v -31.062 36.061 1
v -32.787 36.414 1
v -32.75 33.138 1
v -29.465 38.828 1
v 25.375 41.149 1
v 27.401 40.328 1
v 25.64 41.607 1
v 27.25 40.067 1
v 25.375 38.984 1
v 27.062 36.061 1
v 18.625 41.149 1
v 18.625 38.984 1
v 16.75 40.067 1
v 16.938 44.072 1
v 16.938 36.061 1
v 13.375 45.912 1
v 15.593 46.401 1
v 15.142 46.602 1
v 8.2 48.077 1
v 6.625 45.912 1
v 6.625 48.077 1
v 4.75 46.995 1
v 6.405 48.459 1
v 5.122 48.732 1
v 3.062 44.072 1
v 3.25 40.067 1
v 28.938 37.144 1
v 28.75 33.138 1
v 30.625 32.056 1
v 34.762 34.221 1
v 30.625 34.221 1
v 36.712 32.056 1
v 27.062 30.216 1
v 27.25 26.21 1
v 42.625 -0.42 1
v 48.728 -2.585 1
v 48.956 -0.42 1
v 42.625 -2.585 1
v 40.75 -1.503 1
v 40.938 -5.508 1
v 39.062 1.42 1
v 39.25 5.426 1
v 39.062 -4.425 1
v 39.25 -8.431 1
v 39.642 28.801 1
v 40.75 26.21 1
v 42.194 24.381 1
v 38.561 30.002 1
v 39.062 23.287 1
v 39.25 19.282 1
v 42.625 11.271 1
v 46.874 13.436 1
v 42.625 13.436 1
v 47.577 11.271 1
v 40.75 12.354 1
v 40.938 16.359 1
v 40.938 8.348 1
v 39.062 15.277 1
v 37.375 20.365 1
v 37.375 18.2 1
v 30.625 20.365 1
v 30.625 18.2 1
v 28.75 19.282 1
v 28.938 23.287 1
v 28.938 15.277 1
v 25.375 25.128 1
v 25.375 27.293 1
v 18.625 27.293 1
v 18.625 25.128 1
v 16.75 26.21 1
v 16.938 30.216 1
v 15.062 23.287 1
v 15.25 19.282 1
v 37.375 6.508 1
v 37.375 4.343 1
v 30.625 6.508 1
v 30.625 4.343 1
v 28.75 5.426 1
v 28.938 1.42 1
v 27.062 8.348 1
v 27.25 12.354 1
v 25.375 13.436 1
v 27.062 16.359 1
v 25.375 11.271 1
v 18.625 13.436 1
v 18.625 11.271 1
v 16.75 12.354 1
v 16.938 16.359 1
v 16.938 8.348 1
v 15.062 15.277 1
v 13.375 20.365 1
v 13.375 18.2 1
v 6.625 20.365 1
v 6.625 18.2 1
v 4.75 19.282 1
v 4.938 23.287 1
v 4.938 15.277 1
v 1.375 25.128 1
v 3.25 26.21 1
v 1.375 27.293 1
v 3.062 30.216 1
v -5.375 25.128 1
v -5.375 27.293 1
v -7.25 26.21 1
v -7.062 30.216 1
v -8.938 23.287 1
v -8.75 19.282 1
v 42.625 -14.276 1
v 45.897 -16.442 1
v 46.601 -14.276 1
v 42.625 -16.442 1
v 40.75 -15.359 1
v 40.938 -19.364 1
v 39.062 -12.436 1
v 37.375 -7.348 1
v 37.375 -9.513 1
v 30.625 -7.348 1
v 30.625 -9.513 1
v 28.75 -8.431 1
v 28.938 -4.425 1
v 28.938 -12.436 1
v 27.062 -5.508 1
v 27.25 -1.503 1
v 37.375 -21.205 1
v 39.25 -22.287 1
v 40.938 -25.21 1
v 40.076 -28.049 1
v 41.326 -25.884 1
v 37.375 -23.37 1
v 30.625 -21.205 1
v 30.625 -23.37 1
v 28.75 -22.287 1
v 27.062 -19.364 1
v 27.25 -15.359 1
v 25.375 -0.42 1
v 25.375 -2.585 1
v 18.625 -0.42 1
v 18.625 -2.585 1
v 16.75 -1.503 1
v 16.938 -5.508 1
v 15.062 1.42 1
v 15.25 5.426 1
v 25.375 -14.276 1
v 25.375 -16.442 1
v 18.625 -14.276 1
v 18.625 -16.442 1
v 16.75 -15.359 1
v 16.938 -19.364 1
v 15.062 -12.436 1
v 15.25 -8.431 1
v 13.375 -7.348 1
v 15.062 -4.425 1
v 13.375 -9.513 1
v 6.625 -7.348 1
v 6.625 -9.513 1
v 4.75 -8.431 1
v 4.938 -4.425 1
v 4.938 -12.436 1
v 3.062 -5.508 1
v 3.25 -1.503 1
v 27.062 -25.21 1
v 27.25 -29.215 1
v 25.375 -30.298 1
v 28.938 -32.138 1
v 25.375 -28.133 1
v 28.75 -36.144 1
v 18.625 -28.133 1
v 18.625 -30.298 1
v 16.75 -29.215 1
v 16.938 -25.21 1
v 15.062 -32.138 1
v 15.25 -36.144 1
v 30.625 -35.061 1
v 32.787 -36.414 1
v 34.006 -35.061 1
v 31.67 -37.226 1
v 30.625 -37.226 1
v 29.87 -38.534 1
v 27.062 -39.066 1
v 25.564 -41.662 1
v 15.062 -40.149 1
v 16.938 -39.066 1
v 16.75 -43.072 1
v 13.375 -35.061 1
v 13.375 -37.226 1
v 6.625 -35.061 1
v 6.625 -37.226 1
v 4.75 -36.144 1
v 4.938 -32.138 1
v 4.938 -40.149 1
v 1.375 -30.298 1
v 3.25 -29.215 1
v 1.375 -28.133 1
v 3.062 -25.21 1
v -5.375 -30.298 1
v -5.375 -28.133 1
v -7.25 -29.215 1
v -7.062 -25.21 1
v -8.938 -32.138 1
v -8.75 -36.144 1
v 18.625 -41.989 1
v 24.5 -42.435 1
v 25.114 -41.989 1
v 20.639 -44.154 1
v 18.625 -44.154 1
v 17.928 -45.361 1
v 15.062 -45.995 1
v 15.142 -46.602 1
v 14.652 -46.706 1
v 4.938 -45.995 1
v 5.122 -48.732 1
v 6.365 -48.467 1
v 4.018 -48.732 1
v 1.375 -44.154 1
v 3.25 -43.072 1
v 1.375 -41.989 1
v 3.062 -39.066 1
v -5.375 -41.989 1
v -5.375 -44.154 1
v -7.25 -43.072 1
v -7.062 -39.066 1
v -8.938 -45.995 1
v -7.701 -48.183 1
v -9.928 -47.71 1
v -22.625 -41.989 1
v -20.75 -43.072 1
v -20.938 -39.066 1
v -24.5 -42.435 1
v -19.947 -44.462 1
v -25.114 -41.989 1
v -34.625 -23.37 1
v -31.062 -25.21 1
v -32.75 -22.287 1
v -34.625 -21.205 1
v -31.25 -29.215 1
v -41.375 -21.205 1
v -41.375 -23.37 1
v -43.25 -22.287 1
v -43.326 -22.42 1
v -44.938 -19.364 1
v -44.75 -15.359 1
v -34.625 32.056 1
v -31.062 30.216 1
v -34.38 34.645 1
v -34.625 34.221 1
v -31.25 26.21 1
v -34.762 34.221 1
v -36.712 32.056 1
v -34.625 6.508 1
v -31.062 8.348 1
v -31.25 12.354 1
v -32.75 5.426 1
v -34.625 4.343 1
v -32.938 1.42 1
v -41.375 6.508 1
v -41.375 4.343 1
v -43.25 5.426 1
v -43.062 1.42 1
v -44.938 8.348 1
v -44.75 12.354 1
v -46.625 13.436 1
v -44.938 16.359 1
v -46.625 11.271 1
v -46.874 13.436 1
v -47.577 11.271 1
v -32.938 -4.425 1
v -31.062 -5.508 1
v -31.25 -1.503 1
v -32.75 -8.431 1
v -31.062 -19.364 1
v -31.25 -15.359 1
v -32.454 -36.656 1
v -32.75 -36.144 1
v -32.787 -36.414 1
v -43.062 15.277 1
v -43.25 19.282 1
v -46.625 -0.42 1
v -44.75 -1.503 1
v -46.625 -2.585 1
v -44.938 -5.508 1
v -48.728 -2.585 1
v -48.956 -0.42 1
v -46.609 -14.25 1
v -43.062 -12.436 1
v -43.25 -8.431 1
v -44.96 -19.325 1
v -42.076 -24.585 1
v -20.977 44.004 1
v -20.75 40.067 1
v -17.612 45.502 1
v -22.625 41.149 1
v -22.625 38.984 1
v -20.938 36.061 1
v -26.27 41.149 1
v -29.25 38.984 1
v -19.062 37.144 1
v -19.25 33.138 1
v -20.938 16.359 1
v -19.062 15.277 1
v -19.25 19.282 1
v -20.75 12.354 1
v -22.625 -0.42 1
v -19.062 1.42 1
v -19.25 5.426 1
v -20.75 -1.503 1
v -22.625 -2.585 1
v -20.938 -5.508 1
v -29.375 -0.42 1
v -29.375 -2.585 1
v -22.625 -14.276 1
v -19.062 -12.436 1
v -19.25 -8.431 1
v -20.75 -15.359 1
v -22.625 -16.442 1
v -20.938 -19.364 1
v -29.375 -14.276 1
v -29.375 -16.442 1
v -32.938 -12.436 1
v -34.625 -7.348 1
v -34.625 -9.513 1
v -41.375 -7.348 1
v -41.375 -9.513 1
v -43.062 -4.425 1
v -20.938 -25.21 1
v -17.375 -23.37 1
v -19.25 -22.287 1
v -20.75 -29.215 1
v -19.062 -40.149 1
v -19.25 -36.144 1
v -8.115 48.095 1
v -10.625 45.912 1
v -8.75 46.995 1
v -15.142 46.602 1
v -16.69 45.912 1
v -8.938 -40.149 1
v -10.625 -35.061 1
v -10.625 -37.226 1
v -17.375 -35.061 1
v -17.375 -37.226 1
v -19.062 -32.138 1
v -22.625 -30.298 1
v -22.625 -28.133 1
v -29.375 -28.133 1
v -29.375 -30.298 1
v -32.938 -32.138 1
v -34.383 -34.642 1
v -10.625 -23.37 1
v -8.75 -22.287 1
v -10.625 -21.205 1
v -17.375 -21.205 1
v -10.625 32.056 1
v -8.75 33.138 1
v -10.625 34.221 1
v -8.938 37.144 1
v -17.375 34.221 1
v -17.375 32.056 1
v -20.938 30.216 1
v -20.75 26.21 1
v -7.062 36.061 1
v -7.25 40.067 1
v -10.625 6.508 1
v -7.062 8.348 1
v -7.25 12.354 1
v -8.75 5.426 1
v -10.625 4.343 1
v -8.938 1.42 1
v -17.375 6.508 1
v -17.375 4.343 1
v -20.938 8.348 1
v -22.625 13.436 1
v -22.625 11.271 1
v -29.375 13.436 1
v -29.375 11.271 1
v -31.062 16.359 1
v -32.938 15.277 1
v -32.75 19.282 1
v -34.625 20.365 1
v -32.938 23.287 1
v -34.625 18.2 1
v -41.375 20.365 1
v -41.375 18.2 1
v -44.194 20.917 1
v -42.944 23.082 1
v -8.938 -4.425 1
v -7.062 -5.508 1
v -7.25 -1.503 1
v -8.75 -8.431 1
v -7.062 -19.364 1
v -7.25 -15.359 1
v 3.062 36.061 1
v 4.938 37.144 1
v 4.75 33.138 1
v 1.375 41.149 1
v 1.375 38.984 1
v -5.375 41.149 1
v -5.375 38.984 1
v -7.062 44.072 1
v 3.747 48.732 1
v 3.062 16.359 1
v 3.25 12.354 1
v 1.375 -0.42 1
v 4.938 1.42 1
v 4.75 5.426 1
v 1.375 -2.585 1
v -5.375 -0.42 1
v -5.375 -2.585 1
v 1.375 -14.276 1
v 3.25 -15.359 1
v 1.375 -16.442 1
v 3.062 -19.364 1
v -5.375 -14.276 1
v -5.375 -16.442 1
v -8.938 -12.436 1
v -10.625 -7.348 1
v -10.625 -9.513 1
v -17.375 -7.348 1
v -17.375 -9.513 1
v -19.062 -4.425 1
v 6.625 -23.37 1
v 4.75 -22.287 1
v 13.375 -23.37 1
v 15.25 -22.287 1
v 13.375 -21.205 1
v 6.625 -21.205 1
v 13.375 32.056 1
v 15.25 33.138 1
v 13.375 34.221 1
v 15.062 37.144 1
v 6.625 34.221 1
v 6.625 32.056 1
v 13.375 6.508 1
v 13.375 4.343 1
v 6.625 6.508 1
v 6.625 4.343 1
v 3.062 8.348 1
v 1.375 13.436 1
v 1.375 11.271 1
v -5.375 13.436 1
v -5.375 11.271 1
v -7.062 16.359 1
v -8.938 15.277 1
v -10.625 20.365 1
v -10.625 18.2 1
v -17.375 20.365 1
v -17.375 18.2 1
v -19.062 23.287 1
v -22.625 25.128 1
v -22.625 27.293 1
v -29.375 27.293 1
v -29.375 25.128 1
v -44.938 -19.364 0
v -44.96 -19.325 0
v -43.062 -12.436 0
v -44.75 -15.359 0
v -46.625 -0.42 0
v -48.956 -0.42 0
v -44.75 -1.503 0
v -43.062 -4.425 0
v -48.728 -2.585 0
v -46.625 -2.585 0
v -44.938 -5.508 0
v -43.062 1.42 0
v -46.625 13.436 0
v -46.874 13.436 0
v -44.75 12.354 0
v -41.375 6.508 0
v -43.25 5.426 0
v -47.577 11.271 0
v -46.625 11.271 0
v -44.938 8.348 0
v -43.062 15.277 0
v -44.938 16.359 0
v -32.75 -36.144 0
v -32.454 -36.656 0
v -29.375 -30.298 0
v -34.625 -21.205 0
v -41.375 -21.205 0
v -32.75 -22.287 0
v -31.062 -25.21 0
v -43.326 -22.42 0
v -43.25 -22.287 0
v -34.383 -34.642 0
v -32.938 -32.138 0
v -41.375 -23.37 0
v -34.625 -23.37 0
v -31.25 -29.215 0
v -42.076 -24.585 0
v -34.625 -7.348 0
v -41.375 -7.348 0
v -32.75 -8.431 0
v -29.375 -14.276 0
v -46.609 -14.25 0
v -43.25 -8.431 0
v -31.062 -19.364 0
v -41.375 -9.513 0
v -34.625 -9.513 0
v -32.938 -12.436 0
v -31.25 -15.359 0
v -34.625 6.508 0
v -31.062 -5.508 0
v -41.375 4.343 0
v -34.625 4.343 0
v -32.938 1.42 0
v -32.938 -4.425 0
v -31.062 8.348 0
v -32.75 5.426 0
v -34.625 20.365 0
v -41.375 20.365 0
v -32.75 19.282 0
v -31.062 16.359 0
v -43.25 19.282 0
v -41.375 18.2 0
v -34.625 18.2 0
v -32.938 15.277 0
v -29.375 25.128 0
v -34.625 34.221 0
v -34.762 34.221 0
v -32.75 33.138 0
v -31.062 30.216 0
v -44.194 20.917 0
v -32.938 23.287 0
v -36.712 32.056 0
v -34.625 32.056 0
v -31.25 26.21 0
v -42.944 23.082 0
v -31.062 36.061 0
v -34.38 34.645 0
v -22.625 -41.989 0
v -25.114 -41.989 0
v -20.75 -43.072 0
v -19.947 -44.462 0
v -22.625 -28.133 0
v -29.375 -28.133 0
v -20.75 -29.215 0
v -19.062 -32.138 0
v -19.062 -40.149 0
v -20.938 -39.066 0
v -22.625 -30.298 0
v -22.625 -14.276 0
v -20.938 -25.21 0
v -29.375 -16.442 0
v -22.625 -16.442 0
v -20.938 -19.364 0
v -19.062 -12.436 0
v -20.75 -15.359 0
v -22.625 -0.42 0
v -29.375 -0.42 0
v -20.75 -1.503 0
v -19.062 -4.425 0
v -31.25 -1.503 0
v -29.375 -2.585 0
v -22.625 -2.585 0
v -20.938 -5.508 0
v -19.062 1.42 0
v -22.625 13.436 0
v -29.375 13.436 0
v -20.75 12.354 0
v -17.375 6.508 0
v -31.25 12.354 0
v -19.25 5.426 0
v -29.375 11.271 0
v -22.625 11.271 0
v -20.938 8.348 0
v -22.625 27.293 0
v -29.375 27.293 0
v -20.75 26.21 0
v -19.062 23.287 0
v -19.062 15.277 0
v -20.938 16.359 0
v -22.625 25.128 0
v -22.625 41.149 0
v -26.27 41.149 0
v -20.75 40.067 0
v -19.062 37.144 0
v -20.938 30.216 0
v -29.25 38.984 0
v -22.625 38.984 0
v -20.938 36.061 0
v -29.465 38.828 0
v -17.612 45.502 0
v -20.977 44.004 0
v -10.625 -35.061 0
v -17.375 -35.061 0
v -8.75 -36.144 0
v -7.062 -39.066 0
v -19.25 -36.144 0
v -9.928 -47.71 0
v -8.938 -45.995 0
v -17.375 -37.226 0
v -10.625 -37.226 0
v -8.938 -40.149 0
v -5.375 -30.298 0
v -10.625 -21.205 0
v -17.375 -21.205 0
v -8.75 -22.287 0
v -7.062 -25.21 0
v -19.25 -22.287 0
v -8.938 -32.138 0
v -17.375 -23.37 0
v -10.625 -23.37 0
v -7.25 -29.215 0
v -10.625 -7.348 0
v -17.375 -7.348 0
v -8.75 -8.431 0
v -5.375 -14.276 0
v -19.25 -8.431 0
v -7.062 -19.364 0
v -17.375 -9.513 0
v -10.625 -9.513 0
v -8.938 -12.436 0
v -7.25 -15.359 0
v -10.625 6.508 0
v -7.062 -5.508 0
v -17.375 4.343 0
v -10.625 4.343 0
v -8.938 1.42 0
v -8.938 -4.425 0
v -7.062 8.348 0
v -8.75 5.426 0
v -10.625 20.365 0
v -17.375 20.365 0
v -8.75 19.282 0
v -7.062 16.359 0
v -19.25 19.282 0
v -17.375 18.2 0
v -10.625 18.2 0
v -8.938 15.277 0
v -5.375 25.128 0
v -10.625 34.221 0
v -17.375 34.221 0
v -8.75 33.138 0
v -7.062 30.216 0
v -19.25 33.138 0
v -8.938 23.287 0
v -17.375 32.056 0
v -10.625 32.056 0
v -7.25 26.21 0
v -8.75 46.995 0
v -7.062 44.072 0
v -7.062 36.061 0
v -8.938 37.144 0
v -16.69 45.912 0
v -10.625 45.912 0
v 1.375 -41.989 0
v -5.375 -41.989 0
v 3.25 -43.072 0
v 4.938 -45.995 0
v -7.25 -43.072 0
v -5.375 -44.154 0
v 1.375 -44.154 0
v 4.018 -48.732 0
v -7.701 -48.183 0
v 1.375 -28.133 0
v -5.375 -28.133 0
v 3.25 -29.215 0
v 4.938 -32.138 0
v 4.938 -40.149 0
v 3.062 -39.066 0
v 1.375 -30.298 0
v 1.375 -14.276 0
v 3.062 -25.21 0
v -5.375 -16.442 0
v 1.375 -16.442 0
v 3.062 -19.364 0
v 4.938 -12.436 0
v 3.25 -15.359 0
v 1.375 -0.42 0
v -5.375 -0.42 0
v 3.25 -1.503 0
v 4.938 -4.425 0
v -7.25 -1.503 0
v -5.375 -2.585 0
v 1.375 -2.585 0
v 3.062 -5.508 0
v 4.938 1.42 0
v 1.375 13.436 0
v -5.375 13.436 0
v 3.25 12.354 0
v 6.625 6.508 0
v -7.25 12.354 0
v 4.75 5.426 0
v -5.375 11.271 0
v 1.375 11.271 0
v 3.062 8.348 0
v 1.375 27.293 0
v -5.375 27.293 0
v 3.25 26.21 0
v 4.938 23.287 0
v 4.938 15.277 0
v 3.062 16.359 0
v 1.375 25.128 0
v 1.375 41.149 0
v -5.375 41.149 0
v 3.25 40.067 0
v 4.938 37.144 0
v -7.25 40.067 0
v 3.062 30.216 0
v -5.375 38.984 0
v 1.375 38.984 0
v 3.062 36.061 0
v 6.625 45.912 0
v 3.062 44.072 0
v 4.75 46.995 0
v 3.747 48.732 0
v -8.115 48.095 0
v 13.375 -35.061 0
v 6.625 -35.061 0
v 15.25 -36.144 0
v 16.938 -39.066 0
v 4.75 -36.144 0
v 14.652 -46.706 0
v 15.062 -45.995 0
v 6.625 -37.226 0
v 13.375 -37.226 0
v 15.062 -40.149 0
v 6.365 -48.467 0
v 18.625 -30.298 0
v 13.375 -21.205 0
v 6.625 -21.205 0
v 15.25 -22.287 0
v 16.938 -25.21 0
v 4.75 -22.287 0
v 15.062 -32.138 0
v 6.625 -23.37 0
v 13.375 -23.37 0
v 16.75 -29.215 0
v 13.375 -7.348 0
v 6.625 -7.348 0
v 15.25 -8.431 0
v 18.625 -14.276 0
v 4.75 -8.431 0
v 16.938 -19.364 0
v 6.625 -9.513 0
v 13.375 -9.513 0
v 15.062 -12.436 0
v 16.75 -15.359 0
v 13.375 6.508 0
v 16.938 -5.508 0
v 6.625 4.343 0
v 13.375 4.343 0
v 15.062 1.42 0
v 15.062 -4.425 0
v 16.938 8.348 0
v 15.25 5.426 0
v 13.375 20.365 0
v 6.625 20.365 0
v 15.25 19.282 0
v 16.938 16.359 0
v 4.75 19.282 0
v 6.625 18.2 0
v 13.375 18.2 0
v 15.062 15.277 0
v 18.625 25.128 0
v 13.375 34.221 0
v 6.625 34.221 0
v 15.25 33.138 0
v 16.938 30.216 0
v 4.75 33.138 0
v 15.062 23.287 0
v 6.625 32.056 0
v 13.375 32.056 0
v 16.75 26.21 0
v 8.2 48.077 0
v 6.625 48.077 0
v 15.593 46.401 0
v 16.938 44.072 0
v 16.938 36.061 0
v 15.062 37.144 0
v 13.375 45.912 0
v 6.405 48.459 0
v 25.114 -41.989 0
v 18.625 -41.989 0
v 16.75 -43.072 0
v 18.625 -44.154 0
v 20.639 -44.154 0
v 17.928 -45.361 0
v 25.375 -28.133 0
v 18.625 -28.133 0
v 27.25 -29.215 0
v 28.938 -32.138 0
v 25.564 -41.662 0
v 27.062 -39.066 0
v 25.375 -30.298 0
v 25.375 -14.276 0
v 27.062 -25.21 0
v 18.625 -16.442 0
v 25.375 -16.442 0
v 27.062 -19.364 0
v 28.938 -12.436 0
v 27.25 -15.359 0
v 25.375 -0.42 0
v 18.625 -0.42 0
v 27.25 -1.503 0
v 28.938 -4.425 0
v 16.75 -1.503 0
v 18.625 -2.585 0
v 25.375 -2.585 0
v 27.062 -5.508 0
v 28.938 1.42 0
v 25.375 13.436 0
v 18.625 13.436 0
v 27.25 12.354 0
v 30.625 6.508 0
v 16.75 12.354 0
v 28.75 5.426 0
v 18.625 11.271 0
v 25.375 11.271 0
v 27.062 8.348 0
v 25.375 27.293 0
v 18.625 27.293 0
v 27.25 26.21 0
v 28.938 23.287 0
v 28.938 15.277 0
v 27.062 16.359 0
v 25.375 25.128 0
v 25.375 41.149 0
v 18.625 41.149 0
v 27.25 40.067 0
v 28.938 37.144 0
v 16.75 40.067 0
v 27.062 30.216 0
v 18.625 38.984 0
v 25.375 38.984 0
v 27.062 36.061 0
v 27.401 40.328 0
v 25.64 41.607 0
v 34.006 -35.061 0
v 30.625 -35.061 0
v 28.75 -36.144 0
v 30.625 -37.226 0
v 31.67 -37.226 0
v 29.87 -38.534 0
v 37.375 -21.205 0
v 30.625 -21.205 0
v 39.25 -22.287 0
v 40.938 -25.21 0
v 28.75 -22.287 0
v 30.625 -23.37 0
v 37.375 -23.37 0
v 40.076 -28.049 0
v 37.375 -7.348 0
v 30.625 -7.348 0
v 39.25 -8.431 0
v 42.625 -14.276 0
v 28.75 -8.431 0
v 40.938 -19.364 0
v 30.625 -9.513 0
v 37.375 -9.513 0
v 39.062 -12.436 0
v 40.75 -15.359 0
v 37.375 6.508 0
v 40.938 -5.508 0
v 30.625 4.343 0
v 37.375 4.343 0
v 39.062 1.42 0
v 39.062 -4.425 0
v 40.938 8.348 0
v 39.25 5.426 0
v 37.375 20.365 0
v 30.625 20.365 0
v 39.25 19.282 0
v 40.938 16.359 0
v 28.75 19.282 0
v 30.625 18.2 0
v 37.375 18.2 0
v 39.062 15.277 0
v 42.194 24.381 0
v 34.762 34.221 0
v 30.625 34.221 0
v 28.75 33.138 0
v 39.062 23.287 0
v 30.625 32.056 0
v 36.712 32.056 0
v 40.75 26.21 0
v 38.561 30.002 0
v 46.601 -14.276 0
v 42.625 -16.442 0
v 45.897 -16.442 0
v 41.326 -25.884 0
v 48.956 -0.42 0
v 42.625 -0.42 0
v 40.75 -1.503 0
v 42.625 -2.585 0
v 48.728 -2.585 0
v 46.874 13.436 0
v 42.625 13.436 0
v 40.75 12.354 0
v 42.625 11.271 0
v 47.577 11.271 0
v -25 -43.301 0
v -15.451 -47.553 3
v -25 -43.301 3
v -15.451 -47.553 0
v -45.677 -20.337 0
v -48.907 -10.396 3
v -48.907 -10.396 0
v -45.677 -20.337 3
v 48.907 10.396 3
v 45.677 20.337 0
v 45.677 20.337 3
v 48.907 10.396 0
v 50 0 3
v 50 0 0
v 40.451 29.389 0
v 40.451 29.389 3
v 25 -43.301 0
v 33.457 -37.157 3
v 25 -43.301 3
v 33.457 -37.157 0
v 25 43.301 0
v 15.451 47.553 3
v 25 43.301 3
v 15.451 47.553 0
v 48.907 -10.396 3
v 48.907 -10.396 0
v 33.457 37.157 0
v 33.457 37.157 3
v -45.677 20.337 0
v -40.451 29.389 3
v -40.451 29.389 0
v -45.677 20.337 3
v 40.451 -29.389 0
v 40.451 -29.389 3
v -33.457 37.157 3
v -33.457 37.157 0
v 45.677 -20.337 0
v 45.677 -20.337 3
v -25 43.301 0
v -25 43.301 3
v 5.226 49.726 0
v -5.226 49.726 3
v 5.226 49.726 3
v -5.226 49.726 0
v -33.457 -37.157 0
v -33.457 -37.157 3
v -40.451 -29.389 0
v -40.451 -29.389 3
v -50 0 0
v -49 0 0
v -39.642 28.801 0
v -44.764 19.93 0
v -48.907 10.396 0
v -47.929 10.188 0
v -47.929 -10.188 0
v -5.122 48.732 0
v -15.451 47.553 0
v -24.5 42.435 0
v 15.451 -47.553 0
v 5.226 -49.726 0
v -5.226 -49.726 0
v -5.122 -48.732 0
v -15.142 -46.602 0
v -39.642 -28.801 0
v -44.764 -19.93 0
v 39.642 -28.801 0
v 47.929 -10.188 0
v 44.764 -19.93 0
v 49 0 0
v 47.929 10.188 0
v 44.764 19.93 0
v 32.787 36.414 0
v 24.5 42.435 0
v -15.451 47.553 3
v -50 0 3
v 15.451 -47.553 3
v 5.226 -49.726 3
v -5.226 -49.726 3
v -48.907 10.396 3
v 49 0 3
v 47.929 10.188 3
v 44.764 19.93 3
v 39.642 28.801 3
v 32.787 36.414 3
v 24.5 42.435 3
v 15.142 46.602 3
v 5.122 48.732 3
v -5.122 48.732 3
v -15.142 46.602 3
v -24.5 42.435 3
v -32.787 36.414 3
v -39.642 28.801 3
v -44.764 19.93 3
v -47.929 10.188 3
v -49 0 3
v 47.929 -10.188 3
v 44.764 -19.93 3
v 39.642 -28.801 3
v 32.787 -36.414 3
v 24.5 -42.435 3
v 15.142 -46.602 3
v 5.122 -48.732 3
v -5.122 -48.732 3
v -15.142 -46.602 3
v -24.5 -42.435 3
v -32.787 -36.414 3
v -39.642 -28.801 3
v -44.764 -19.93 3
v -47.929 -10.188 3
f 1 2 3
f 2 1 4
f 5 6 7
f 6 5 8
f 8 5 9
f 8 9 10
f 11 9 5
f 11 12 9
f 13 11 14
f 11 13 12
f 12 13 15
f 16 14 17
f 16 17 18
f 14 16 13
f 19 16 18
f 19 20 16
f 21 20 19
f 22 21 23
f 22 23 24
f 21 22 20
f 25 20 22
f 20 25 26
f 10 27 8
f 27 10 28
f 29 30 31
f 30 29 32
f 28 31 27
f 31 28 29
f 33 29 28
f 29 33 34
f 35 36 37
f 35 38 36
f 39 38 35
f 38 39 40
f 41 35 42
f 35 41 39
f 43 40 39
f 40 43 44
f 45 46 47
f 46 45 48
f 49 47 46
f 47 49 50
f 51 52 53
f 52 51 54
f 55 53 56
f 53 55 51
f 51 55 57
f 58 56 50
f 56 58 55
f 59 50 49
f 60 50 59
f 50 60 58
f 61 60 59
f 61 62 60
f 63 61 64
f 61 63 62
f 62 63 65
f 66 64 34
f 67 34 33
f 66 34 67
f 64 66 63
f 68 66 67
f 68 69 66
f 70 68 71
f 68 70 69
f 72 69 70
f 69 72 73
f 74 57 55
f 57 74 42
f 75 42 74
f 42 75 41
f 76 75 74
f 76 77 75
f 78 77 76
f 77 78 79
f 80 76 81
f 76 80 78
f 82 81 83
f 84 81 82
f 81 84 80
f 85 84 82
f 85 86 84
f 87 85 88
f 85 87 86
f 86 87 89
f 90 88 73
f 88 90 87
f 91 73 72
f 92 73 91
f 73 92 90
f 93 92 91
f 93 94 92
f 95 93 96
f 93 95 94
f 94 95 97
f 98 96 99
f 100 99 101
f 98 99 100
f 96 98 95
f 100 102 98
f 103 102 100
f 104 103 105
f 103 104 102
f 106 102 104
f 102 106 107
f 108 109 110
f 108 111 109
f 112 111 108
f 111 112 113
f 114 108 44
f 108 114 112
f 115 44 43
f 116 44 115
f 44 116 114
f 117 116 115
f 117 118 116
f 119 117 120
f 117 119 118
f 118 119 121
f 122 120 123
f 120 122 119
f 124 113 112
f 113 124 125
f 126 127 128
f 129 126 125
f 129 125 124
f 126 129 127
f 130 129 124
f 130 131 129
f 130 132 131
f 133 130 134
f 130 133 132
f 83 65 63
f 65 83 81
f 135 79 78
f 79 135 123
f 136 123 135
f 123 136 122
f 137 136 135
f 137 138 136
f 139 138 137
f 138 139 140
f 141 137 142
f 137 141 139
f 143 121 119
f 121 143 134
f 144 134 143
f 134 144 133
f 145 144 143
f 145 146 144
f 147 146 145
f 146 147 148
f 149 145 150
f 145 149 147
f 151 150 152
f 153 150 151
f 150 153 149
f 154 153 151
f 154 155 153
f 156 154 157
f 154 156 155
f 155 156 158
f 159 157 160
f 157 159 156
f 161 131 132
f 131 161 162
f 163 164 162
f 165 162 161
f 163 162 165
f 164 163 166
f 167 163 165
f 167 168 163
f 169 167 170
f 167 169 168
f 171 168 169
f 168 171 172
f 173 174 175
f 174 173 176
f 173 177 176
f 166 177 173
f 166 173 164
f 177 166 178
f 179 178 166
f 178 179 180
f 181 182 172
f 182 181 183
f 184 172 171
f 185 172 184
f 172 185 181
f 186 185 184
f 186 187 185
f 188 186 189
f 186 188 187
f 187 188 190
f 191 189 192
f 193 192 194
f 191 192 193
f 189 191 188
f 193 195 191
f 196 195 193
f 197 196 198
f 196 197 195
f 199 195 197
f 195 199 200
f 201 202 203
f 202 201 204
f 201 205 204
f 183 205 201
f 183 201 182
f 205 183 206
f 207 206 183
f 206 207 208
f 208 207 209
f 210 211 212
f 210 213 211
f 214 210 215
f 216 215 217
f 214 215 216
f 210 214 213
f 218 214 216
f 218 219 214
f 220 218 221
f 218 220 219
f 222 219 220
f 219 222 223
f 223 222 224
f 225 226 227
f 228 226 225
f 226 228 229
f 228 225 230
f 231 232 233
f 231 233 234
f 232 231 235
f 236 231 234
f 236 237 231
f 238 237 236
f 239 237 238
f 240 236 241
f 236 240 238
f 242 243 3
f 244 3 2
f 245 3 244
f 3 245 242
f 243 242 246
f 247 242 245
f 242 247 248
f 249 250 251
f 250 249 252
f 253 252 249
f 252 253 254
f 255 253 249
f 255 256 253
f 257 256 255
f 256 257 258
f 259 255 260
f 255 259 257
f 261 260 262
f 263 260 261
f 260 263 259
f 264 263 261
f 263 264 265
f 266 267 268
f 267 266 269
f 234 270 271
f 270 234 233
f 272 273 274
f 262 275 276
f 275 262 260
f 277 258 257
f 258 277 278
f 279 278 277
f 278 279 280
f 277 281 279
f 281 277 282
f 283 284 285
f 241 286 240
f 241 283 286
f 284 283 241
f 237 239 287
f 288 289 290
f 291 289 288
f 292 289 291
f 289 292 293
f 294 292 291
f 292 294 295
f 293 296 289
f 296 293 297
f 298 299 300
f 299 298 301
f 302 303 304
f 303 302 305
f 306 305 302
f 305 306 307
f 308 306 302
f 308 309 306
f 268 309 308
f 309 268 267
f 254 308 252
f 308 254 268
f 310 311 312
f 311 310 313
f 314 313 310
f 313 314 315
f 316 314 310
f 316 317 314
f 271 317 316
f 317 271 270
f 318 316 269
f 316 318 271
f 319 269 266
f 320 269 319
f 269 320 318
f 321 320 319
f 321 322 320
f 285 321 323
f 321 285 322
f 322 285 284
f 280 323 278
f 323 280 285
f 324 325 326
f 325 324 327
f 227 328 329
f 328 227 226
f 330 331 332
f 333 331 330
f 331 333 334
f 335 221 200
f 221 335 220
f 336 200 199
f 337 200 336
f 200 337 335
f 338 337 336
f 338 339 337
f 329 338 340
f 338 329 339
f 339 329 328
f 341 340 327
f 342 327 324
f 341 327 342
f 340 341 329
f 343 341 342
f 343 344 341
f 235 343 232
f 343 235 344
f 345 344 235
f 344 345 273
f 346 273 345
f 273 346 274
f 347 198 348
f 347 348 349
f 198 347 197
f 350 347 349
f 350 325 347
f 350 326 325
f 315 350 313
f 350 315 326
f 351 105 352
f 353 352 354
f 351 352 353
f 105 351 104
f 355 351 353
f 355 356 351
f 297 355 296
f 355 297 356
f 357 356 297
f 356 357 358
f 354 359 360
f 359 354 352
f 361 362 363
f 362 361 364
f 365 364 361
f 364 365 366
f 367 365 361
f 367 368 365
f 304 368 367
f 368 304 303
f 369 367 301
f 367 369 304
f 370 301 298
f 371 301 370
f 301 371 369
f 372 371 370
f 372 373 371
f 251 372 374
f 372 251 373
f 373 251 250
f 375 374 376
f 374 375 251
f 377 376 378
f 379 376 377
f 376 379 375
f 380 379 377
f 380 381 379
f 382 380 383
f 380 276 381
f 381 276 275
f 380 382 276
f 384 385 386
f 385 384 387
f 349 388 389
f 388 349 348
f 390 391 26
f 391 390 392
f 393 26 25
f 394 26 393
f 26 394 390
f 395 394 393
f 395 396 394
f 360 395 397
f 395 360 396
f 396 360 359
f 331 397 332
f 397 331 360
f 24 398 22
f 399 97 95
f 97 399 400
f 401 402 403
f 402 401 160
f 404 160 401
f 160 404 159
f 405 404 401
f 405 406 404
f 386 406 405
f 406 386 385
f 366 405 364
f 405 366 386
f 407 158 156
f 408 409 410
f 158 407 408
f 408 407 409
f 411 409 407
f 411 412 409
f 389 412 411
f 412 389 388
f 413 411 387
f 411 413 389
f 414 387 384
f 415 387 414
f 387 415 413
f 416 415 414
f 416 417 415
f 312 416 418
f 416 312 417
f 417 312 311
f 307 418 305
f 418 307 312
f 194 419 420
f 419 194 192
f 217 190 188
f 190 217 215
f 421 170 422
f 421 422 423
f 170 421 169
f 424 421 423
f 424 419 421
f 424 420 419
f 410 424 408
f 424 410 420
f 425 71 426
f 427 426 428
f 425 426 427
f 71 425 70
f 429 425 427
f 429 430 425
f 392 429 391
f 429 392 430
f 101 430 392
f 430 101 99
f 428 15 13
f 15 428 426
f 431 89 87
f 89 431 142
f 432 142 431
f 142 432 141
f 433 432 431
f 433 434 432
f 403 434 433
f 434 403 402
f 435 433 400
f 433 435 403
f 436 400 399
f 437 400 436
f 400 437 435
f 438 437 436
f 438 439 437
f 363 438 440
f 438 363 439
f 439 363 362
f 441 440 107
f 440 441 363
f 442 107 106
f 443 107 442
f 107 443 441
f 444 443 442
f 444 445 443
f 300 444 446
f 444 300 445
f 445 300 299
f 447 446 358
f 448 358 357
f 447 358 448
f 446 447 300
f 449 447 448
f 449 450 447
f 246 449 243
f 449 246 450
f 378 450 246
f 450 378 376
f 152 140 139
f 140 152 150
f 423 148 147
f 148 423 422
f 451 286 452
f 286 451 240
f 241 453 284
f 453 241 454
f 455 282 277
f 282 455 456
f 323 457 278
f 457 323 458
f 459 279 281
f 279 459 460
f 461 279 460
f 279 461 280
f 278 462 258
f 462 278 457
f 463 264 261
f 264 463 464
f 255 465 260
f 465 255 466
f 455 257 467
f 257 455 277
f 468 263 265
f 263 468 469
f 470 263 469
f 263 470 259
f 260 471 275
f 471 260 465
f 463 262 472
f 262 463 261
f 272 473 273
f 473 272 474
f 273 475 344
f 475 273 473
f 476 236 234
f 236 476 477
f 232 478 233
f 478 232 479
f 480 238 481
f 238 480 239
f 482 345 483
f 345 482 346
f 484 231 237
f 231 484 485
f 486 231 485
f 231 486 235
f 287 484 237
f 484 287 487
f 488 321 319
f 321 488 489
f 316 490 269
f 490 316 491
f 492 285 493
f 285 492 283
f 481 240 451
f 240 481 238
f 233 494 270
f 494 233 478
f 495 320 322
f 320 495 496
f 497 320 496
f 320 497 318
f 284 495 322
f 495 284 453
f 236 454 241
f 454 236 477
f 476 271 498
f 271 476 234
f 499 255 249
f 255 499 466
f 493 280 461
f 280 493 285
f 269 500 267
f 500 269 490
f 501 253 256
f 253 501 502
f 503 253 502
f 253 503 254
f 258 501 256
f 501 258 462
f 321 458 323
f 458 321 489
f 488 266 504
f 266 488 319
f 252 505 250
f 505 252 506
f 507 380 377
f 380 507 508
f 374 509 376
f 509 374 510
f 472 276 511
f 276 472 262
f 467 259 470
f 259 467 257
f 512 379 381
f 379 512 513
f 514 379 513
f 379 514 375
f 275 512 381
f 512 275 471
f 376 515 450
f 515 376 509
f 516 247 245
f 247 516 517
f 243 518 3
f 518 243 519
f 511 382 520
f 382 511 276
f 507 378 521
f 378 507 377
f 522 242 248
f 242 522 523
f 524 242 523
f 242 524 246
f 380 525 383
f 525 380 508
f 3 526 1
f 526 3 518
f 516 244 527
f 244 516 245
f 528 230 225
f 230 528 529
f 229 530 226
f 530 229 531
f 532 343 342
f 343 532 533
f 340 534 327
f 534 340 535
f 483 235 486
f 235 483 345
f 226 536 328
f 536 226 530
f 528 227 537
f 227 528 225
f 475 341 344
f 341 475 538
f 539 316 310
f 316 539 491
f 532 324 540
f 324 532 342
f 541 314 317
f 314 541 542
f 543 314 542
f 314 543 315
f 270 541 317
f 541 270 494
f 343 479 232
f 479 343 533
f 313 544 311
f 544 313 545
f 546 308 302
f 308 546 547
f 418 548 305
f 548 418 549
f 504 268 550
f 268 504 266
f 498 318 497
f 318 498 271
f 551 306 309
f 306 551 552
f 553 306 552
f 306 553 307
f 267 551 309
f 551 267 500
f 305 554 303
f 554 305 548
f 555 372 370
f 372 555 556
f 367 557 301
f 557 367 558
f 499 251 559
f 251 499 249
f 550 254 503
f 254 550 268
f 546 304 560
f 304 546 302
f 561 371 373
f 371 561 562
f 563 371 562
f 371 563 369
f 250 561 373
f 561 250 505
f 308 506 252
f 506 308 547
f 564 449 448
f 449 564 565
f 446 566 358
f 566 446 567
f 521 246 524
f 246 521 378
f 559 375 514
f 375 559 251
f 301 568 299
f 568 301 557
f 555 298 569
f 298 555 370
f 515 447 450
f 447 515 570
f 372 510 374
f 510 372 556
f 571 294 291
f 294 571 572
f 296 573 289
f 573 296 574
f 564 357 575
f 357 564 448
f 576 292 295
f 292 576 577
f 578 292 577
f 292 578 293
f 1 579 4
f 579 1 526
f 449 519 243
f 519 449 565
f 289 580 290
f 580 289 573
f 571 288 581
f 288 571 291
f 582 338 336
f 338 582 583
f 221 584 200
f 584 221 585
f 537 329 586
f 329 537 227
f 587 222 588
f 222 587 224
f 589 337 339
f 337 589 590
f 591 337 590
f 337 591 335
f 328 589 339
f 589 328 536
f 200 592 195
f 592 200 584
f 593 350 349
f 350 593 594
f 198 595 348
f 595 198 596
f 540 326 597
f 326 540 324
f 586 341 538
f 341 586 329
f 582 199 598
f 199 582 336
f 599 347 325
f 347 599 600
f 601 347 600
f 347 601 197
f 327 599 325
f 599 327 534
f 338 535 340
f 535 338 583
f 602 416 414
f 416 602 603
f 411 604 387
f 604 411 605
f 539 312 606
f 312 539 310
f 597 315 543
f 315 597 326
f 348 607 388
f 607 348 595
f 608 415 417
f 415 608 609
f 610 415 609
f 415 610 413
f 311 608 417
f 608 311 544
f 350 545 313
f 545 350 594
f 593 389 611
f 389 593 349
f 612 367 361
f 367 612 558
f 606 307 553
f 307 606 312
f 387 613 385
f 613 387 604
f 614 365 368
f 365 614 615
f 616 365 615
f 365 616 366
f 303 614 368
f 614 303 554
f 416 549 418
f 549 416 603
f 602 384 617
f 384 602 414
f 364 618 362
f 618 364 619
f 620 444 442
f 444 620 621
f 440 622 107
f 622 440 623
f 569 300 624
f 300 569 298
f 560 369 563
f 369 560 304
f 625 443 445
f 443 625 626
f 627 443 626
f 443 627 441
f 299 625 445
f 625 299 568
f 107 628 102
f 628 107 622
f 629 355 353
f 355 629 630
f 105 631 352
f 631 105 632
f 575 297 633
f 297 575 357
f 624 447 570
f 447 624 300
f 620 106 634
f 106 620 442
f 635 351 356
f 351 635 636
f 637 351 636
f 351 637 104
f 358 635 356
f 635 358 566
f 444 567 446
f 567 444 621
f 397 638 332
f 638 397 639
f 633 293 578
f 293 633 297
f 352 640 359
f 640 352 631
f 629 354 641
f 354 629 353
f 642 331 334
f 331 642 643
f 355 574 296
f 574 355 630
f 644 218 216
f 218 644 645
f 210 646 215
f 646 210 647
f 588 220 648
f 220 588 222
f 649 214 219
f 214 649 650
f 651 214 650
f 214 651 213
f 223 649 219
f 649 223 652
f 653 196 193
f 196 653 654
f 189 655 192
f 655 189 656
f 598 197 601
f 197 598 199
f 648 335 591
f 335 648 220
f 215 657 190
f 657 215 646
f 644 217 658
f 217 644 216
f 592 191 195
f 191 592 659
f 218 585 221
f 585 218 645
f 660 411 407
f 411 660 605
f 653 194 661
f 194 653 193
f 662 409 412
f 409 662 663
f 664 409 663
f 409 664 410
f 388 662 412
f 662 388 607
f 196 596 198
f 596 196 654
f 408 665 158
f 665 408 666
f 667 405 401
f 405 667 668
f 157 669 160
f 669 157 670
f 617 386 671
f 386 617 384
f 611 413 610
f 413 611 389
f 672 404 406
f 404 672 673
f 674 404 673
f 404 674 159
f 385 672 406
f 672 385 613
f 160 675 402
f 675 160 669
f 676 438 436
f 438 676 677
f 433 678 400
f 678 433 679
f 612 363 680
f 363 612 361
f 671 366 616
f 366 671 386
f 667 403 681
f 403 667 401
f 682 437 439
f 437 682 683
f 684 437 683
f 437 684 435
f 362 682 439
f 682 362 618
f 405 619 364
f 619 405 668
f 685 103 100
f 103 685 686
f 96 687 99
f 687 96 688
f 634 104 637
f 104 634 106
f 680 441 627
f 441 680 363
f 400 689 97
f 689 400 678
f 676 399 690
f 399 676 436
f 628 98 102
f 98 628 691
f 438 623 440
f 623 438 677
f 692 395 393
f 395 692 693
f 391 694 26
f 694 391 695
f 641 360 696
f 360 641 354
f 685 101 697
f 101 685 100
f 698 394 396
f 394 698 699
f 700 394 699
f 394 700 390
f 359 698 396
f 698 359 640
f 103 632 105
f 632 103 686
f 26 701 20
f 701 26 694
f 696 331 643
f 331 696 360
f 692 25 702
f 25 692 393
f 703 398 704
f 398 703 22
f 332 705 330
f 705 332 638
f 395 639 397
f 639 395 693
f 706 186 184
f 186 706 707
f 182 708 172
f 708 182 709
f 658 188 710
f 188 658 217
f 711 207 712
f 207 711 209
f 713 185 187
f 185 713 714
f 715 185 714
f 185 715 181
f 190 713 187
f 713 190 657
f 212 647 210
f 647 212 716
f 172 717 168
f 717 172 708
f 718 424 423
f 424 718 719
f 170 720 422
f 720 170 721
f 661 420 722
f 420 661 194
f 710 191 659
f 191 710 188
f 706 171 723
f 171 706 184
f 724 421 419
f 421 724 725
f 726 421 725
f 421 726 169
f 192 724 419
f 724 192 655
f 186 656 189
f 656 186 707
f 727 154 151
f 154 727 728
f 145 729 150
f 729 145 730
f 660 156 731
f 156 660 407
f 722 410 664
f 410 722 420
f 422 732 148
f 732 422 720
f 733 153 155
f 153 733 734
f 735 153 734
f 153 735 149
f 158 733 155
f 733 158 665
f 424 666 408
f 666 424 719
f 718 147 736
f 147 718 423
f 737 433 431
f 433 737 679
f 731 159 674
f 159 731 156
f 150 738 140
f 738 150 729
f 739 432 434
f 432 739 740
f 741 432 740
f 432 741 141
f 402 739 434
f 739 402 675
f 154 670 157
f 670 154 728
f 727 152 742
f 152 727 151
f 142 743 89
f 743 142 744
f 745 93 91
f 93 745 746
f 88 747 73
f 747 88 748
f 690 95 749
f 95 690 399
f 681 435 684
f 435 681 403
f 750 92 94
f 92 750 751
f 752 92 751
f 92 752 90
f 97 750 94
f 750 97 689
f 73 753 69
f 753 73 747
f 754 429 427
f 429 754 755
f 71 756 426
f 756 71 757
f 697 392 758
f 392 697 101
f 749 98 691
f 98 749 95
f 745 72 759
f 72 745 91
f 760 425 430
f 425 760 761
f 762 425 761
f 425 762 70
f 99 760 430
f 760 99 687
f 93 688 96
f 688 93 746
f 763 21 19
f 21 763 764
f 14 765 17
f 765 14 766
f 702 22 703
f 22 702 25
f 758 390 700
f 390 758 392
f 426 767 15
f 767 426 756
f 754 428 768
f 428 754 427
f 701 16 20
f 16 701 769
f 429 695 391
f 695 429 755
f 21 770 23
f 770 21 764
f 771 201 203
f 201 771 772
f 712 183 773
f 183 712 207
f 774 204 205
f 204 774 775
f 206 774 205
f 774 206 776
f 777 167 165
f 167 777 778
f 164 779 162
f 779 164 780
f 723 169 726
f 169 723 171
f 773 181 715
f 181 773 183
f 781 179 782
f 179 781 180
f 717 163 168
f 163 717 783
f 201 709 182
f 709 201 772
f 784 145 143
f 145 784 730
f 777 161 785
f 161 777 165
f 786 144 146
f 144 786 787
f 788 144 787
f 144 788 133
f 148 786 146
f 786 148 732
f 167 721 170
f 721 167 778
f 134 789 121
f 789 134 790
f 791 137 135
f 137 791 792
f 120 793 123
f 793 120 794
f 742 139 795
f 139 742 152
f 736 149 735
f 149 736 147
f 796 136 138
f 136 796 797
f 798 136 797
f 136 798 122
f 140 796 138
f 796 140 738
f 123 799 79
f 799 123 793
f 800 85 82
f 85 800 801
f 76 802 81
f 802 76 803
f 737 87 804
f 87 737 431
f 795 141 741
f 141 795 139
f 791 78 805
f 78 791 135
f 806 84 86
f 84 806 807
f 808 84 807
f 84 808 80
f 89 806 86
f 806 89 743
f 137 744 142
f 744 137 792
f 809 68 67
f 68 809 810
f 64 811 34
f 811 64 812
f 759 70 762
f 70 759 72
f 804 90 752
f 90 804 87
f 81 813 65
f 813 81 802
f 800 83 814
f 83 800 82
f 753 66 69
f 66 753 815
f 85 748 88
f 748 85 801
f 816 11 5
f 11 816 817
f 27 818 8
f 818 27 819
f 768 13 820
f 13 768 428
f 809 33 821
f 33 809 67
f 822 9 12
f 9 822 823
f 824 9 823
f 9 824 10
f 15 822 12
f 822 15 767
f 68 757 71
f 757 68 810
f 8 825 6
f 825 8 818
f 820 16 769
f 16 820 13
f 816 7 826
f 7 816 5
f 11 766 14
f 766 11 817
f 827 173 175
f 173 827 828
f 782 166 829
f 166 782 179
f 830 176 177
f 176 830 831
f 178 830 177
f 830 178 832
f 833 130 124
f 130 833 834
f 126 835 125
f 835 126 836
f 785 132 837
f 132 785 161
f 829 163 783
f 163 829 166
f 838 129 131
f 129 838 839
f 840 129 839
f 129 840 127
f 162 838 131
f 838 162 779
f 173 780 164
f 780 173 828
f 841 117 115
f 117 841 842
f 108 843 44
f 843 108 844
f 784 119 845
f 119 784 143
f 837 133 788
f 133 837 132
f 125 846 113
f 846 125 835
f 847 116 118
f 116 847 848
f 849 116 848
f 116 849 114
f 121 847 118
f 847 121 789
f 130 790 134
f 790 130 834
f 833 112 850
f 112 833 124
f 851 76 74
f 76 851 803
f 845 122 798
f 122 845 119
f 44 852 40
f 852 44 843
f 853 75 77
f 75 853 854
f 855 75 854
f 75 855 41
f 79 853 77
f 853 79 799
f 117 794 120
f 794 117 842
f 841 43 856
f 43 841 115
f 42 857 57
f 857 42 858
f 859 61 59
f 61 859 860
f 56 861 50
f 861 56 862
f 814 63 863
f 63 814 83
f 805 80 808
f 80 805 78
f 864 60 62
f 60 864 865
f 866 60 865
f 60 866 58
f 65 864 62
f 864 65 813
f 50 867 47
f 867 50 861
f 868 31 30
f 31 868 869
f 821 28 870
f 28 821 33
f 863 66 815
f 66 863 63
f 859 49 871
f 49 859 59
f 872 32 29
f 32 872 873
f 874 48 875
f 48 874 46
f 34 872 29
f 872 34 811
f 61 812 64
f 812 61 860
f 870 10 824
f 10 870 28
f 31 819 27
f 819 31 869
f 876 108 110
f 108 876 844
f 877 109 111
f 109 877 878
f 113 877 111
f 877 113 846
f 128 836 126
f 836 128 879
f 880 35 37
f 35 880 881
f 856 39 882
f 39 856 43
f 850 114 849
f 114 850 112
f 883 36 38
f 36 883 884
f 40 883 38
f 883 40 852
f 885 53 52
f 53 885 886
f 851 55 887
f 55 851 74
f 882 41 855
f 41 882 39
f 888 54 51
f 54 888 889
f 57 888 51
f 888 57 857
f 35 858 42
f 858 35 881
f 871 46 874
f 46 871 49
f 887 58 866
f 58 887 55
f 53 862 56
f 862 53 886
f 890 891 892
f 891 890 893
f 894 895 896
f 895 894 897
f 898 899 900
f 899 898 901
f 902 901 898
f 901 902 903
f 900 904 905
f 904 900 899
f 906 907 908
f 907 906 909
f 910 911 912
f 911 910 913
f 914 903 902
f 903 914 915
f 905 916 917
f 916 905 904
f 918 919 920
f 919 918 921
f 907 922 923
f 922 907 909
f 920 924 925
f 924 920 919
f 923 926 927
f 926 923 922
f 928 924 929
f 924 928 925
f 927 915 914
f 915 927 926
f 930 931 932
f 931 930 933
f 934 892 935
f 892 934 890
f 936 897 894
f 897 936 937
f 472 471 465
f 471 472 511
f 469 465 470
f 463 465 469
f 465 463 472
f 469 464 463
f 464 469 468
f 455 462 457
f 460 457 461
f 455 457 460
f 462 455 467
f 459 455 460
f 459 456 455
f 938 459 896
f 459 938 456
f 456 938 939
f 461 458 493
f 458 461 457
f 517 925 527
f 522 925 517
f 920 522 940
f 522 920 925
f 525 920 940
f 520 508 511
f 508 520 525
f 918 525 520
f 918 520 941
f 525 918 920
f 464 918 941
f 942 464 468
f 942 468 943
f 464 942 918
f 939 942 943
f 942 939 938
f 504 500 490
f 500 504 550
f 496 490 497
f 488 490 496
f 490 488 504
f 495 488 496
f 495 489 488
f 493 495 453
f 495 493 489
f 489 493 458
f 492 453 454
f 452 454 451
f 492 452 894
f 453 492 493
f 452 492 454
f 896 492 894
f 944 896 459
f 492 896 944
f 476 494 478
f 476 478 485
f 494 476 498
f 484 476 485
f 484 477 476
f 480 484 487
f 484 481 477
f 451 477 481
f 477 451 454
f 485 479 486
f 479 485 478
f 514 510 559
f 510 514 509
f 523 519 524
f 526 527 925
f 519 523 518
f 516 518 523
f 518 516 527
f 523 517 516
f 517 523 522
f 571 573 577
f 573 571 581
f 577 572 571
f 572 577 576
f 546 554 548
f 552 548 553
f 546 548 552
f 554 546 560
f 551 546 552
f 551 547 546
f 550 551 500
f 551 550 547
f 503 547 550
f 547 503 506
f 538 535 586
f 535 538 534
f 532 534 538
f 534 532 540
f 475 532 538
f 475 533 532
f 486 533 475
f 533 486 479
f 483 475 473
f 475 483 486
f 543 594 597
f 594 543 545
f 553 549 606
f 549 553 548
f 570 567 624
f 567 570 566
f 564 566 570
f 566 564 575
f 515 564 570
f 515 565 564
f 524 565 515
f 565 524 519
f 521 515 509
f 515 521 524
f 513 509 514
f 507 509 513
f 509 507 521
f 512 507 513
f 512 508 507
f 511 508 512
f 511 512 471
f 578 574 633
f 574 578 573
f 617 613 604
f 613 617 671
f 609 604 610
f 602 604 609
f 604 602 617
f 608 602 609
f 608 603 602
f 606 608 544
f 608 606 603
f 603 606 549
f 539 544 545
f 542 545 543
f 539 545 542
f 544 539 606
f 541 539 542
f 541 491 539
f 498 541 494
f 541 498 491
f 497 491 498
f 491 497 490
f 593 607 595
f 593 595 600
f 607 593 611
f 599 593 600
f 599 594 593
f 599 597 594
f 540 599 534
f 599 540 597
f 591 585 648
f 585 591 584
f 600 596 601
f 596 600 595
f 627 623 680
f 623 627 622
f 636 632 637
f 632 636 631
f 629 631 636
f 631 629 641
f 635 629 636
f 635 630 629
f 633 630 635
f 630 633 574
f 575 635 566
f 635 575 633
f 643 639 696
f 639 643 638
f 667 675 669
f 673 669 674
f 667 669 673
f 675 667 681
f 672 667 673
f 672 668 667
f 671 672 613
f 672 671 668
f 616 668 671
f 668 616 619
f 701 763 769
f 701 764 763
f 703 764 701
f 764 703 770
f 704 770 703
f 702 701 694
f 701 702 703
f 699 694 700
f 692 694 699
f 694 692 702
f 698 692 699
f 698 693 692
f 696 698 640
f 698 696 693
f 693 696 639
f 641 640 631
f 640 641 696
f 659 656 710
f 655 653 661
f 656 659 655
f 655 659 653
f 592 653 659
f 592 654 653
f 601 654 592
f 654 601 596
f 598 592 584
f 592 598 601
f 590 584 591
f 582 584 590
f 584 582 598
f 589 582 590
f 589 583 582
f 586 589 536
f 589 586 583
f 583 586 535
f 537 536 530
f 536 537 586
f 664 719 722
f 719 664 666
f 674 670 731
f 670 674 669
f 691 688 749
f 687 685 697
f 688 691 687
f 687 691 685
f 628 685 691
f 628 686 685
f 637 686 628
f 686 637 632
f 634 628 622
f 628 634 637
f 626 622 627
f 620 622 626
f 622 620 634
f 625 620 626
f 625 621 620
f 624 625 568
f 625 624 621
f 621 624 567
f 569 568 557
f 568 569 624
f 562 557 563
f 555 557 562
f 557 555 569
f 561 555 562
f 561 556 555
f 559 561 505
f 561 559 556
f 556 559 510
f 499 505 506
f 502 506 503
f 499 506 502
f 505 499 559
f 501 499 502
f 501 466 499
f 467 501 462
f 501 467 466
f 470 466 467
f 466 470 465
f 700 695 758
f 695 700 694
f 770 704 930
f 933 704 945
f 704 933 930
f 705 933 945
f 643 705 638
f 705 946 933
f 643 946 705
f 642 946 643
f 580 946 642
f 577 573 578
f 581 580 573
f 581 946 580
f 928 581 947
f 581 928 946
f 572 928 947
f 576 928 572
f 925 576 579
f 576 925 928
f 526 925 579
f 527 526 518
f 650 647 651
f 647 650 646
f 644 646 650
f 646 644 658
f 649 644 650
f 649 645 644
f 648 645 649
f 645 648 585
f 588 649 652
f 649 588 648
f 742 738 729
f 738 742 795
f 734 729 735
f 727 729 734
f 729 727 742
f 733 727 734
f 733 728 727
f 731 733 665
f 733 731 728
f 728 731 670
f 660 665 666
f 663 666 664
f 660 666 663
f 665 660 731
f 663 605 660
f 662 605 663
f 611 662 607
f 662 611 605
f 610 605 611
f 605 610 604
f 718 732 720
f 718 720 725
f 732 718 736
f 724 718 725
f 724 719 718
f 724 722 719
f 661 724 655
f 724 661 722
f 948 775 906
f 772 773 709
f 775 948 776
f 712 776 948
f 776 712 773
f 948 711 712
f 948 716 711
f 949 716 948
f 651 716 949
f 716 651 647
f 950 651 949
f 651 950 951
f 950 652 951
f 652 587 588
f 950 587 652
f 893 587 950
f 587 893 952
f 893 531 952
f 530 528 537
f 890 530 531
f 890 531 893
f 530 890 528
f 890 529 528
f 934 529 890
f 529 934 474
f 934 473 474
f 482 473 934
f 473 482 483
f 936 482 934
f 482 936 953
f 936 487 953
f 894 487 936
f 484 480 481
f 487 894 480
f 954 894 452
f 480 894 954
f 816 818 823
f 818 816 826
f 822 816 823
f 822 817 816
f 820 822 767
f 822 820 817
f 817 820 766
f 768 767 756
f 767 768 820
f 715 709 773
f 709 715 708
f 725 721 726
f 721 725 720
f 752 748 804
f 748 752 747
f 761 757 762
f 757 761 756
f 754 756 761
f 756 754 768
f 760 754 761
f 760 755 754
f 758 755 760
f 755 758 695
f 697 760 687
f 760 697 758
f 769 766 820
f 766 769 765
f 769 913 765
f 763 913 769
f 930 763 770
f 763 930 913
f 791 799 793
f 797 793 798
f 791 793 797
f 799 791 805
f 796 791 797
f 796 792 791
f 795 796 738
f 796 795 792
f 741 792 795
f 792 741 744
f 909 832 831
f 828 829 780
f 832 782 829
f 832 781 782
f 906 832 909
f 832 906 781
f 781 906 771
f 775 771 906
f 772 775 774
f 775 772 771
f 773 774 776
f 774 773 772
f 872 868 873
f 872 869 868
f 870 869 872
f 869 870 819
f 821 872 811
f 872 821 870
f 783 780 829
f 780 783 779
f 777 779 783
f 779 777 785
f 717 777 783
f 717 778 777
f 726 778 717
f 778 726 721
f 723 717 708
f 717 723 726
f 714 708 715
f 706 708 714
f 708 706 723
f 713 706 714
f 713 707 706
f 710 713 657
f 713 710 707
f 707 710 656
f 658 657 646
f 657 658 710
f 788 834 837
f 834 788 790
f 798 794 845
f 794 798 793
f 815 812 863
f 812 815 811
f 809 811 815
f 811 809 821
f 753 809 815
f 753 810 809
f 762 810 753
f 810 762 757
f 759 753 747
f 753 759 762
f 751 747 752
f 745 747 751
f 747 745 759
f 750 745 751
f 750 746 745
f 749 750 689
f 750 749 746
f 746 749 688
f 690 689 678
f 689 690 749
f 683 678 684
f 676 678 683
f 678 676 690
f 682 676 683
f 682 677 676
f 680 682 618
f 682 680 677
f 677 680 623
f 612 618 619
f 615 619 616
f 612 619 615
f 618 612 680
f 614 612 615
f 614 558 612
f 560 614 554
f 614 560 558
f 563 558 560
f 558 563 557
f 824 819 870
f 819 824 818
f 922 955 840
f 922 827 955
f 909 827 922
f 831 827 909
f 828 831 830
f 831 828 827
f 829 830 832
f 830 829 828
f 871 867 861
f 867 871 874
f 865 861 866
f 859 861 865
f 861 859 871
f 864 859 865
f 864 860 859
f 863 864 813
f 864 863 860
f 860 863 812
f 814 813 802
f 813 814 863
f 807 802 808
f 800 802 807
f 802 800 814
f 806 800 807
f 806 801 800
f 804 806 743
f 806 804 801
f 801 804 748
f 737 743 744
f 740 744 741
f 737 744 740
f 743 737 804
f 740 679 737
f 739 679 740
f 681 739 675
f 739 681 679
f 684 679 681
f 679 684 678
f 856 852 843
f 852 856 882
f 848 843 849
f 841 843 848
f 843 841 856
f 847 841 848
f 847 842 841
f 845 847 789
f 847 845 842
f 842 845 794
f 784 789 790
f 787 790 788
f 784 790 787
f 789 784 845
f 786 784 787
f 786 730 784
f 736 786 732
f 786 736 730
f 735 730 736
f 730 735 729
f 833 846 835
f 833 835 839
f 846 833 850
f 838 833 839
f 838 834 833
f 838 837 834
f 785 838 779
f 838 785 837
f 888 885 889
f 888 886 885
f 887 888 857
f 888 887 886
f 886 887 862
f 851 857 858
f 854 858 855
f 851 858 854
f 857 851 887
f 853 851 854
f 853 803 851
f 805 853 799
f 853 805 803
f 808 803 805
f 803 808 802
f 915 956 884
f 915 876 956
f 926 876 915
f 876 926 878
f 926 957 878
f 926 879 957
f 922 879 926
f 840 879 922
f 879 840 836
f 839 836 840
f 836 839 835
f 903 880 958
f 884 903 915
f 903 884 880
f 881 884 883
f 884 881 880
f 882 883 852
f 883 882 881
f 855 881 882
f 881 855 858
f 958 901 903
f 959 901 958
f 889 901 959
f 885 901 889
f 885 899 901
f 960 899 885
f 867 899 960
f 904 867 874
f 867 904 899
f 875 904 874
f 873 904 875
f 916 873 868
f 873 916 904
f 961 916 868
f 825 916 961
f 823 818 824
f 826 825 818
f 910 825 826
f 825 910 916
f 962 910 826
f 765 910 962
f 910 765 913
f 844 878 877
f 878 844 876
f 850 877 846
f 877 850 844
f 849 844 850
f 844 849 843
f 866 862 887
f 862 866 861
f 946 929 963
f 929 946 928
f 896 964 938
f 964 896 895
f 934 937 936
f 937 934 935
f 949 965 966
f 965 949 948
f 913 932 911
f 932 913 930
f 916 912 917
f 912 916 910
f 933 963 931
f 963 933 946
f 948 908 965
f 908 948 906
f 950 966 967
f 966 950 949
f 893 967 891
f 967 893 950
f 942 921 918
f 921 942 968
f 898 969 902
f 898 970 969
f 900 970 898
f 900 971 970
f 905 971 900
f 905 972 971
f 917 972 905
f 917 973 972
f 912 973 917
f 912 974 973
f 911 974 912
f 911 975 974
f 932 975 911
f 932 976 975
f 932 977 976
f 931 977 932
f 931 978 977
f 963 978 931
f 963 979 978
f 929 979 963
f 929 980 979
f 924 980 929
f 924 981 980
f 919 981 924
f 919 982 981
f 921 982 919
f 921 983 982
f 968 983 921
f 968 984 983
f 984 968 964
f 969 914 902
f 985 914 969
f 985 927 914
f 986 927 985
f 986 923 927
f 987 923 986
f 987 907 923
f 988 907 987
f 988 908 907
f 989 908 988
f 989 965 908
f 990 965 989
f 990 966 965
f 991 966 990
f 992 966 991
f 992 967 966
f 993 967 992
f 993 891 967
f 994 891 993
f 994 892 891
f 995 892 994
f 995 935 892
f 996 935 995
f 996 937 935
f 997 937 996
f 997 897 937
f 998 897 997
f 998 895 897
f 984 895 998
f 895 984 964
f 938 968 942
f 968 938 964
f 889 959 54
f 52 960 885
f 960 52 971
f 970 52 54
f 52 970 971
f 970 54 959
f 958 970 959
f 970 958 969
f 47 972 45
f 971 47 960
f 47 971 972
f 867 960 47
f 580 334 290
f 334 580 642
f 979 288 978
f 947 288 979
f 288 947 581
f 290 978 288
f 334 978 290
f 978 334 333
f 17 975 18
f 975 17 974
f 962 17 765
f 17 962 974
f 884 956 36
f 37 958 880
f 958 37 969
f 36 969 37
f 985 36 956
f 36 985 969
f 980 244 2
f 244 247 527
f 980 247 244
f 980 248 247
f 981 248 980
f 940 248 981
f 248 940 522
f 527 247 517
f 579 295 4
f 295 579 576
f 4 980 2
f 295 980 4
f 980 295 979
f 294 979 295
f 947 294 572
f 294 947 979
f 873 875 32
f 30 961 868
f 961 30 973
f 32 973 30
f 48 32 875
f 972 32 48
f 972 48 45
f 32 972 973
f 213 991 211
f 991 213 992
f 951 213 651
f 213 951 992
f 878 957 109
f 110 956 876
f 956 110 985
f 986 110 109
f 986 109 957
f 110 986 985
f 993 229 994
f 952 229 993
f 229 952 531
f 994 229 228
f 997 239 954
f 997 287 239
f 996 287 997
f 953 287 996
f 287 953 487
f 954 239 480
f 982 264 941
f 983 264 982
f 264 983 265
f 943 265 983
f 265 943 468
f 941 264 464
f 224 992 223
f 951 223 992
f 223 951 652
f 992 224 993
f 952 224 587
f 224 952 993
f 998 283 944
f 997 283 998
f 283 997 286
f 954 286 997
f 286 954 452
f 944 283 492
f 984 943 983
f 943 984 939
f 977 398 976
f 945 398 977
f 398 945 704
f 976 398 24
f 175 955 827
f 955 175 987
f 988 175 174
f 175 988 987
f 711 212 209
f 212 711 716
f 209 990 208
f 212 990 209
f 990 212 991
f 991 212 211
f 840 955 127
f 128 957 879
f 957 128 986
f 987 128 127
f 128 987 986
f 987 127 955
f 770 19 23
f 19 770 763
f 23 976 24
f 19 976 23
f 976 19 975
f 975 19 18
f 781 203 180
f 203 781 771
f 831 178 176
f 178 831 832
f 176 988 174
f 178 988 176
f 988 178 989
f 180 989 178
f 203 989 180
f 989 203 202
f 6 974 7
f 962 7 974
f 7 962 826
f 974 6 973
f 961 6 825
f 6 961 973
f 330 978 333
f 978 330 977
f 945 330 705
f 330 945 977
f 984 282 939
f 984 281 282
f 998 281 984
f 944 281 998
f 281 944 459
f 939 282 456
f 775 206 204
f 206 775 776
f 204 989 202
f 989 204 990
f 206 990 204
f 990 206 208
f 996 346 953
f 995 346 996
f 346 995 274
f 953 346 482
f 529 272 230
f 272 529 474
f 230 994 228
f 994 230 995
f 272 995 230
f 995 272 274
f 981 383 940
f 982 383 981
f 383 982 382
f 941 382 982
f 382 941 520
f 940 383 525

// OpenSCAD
// Customizable hex pattern
// Created by Kjell Kernen
// Date 11.10.2015

/*[Pattern Parameters]*/
// of the pattern in mm:
diameter=100;           // [10:150]

// of the pattern in tens of mm:
height=20;              // [2:200]

// in tens of mm:
border_width=20;        // [2:100]

// in tens of mm:
border_height=30;       // [2:100]

// in mm:
hex_radius=8;           // [1:20]

// in tens of mm: 
hex_border_width=25;    // [2:50]

/*[Hidden]*/
x=sqrt(3/4*hex_radius*hex_radius);
ystep=2*x;
xstep=3*hex_radius/2;

module hex(x,y)
{
	difference()
	{
		translate([x,y,-height/20]) 
			cylinder(r=(hex_radius+hex_border_width/20), h=height/10, $fn=6);	
		translate([x,y,-(height/20)-1]) 
			cylinder(r=(hex_radius-hex_border_width/20), h=(height/10)+2, $fn=6);
	}
}

//Pattern
intersection()
{
    intersection()
	{
		for (xi=[0:xstep:diameter])
			for(yi=[0:ystep:diameter])
				hex(xi-diameter/2,((((xi/xstep)%2)==0)?0:ystep/2)+yi-diameter/2);
		translate([-diameter/2, -diameter/2, -height/20]) 
			cube([diameter,diameter,height/10]);
	}
	cylinder( d=diameter, h=height );
}

// Frame
difference()
{
	cylinder( d=diameter, h=border_height/10 );
	translate ([0,0,-1])
		cylinder( d=diameter-border_width/10, h=(border_height/10) + 2  );
}



